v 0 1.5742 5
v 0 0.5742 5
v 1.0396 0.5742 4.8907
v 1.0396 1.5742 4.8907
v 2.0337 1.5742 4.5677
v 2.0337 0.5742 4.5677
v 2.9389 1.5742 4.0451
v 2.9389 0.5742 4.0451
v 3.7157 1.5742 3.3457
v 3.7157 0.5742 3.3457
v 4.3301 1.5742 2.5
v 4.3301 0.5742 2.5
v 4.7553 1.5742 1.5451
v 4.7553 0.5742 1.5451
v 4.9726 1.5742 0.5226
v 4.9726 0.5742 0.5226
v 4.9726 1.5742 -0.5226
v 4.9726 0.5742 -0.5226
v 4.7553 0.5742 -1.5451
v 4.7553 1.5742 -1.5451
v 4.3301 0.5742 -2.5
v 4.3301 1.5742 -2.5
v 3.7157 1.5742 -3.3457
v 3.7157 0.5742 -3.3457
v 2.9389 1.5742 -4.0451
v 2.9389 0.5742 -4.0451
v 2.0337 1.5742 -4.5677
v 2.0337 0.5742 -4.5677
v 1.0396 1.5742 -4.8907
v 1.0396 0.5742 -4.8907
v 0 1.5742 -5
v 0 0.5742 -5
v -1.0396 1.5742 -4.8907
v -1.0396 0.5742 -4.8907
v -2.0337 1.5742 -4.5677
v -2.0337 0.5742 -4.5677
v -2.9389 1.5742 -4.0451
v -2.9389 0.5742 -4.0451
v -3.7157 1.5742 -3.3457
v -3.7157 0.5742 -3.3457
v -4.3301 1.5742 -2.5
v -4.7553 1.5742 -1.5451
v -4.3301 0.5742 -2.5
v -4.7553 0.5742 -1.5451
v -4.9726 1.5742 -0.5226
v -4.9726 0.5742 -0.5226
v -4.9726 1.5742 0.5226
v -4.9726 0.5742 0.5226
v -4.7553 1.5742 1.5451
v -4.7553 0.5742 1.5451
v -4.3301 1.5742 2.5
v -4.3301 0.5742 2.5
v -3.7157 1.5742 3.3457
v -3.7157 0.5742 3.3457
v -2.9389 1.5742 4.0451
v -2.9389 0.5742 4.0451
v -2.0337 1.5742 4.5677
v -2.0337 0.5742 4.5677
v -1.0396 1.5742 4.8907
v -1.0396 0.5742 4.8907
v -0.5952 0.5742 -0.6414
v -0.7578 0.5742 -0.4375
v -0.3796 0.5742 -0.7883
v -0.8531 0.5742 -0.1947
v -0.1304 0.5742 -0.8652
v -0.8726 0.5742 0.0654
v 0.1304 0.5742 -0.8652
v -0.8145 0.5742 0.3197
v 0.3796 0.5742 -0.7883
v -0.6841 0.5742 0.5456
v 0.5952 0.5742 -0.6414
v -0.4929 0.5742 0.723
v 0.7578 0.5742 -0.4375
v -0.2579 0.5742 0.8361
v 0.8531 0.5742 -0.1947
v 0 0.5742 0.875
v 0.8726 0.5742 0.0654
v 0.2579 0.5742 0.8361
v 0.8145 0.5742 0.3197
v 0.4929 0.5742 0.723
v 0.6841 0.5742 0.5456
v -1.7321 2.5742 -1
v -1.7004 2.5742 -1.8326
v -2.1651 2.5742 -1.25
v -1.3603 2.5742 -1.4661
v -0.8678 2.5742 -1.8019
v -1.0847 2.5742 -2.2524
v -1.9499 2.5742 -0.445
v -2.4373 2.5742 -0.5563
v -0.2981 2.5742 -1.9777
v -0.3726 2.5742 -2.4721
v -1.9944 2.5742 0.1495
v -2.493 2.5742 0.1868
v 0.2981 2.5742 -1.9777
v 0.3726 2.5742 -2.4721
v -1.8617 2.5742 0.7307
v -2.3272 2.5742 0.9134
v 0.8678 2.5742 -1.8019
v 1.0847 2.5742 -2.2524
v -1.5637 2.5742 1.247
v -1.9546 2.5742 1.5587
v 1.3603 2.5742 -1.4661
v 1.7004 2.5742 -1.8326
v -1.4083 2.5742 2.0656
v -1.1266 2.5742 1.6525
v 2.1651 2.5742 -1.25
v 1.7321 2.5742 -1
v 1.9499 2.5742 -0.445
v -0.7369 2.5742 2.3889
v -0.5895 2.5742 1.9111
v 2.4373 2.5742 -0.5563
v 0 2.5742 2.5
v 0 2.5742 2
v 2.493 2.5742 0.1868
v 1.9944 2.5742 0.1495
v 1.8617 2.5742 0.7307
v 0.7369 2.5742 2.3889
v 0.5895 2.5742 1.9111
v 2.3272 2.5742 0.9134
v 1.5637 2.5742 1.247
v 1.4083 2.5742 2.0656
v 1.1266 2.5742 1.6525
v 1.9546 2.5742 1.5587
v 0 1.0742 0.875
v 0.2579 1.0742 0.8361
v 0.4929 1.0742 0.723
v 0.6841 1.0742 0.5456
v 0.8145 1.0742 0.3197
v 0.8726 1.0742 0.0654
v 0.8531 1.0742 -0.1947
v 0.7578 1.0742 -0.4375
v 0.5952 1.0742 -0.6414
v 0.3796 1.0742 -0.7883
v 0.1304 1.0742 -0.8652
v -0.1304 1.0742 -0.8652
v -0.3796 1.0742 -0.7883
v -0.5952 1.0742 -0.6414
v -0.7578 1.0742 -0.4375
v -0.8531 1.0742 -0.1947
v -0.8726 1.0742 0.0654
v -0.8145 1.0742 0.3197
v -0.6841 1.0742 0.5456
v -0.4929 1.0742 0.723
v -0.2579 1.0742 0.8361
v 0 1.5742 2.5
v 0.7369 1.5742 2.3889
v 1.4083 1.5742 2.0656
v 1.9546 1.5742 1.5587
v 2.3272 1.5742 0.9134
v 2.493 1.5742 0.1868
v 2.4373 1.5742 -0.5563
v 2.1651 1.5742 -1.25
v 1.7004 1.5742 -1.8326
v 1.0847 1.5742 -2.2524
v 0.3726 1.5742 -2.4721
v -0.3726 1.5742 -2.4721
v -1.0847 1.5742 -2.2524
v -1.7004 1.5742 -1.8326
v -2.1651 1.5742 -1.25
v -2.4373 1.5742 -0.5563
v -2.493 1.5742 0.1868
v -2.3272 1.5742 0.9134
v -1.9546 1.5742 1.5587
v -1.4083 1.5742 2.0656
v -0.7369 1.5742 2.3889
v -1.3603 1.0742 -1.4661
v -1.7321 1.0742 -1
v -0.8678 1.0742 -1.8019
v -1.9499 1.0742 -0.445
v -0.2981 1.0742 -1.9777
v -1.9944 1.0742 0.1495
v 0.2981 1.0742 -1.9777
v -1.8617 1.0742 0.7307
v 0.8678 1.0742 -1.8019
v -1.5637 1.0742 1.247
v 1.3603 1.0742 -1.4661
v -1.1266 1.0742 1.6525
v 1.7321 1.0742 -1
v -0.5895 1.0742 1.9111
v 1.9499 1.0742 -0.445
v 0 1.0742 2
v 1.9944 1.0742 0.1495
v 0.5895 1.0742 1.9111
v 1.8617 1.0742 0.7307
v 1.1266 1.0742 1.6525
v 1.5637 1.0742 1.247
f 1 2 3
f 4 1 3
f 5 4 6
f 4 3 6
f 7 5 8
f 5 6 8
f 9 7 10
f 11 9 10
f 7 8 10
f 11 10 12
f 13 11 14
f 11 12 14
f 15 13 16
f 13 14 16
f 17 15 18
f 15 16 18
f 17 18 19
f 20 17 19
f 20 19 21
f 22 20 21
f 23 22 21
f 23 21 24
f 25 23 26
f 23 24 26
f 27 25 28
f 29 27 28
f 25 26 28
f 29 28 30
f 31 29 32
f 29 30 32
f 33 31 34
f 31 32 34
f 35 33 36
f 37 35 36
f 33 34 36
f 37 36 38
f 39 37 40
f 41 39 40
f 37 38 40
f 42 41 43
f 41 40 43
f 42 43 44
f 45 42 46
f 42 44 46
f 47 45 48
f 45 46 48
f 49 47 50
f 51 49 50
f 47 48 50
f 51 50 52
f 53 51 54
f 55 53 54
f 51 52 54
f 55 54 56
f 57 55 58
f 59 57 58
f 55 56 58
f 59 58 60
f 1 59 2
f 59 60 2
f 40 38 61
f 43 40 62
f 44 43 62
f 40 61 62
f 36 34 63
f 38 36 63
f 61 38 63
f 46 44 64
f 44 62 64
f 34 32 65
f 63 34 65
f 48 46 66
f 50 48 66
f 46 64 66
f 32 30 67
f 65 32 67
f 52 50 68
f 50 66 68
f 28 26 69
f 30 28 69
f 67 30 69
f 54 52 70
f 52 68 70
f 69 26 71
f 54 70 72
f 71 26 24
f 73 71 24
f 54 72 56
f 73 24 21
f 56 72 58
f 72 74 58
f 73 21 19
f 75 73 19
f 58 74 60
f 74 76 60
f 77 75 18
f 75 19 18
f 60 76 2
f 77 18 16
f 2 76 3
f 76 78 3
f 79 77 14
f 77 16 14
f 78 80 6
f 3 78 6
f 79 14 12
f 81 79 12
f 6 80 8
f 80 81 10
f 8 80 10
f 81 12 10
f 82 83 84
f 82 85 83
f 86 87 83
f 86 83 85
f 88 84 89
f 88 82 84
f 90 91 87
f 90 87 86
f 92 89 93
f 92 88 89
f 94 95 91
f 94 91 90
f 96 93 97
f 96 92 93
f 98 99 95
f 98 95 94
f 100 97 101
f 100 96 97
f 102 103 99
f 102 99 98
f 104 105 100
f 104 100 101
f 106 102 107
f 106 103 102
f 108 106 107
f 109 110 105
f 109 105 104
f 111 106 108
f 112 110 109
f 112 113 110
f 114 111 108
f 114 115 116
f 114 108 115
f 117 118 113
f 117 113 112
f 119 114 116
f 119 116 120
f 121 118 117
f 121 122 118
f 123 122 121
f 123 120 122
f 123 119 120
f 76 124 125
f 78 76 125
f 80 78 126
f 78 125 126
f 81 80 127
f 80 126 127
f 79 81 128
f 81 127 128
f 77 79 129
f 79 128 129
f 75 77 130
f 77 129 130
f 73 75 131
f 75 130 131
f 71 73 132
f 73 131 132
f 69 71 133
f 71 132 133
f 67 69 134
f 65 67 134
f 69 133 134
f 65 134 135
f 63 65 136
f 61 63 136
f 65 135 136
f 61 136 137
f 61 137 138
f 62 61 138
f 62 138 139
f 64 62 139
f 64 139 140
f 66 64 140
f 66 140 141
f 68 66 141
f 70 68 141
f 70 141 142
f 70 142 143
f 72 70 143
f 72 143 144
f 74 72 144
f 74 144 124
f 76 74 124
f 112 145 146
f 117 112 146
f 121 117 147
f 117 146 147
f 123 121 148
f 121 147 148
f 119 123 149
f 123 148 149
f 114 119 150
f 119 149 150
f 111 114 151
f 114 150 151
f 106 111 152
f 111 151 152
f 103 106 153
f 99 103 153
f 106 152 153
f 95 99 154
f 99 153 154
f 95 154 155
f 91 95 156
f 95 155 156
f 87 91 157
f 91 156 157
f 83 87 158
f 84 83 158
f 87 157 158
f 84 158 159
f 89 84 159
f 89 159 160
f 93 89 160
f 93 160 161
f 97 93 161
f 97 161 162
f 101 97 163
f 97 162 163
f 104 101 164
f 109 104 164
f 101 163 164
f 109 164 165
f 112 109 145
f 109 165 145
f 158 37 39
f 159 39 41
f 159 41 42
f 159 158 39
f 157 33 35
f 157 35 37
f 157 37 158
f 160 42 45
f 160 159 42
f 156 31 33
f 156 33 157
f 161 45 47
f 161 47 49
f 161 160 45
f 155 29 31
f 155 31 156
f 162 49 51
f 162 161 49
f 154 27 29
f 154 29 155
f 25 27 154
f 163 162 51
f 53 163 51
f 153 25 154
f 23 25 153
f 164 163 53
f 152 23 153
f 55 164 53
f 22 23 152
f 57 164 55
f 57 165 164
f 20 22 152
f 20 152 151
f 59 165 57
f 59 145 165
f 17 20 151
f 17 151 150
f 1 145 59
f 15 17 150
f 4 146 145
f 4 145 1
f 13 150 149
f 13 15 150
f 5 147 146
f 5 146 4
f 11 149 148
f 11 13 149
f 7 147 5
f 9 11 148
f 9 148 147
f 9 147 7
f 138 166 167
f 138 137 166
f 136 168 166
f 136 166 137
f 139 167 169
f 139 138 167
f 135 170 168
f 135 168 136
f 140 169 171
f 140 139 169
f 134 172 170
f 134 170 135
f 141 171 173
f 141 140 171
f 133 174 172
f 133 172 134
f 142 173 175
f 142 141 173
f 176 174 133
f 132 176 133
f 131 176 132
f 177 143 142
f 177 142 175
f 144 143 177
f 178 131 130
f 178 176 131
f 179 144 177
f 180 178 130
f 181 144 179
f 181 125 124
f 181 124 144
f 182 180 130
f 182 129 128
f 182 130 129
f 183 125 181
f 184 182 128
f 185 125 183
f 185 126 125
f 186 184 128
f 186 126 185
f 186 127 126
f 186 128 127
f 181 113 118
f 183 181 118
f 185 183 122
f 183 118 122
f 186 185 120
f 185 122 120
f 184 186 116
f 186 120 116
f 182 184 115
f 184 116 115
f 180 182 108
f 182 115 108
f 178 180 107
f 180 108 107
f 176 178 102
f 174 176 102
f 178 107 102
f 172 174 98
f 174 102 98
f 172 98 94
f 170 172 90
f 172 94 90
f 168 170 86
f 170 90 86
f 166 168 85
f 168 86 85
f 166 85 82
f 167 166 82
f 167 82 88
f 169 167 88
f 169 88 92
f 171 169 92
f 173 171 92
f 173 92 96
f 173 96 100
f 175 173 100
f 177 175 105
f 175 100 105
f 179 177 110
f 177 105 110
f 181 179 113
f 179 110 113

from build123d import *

# Parameters (mm, degrees)
SKETCH_1_R          = 10
EXTRUDE_1_DEPTH     = 2
SKETCH_2_R          = 5
EXTRUDE_2_DEPTH     = 2
SKETCH_3_R          = 1.75
CUT_EXTRUDE_1_DEPTH = 15.696938457
SKETCH_4_R          = 4
CUT_EXTRUDE_2_DEPTH = 3
SCALE_1_SCALE       = 0.5


with BuildPart() as part:
    # 草图1 → 凸台-拉伸1 (new body)
    with BuildSketch(Plane(origin=(0, 0, 0), x_dir=(1, 0, 0), z_dir=(0, 1, 0))):
        with Locations(Location((0, 0, 0), (0, 0, 270))):
            Circle(SKETCH_1_R)
    extrude(amount=EXTRUDE_1_DEPTH)

    # 草图2 → 凸台-拉伸2 (add)
    with BuildSketch(Plane(origin=(0, 2, 0), x_dir=(1, 0, 0), z_dir=(0, 1, 0))):
        with Locations(Location((0, 0, 0), (0, 0, 270))):
            Circle(SKETCH_2_R)
    extrude(amount=EXTRUDE_2_DEPTH)

    # 草图3 → 切除-拉伸1 (cut, through all)
    with BuildSketch(Plane(origin=(0, 4, 0), x_dir=(1, 0, 0), z_dir=(0, 1, 0))):
        with Locations(Location((0, 0, 0), (0, 0, 270))):
            Circle(SKETCH_3_R)
    extrude(amount=-CUT_EXTRUDE_1_DEPTH, mode=Mode.SUBTRACT)

    # 草图4 → 切除-拉伸2 (cut)
    with BuildSketch(Plane(origin=(0, 4, 0), x_dir=(1, 0, 0), z_dir=(0, 1, 0))):
        with Locations(Location((0, 0, 0), (0, 0, 270))):
            Circle(SKETCH_4_R)
    extrude(amount=-CUT_EXTRUDE_2_DEPTH, mode=Mode.SUBTRACT)


with BuildPart() as part_1:
    # 缩放比例1: scaled about (0, 1.148444863, 0)
    add(part.part.scale(SCALE_1_SCALE).moved(Location((0, 0.574222431, 0))))


solid = part_1.part
